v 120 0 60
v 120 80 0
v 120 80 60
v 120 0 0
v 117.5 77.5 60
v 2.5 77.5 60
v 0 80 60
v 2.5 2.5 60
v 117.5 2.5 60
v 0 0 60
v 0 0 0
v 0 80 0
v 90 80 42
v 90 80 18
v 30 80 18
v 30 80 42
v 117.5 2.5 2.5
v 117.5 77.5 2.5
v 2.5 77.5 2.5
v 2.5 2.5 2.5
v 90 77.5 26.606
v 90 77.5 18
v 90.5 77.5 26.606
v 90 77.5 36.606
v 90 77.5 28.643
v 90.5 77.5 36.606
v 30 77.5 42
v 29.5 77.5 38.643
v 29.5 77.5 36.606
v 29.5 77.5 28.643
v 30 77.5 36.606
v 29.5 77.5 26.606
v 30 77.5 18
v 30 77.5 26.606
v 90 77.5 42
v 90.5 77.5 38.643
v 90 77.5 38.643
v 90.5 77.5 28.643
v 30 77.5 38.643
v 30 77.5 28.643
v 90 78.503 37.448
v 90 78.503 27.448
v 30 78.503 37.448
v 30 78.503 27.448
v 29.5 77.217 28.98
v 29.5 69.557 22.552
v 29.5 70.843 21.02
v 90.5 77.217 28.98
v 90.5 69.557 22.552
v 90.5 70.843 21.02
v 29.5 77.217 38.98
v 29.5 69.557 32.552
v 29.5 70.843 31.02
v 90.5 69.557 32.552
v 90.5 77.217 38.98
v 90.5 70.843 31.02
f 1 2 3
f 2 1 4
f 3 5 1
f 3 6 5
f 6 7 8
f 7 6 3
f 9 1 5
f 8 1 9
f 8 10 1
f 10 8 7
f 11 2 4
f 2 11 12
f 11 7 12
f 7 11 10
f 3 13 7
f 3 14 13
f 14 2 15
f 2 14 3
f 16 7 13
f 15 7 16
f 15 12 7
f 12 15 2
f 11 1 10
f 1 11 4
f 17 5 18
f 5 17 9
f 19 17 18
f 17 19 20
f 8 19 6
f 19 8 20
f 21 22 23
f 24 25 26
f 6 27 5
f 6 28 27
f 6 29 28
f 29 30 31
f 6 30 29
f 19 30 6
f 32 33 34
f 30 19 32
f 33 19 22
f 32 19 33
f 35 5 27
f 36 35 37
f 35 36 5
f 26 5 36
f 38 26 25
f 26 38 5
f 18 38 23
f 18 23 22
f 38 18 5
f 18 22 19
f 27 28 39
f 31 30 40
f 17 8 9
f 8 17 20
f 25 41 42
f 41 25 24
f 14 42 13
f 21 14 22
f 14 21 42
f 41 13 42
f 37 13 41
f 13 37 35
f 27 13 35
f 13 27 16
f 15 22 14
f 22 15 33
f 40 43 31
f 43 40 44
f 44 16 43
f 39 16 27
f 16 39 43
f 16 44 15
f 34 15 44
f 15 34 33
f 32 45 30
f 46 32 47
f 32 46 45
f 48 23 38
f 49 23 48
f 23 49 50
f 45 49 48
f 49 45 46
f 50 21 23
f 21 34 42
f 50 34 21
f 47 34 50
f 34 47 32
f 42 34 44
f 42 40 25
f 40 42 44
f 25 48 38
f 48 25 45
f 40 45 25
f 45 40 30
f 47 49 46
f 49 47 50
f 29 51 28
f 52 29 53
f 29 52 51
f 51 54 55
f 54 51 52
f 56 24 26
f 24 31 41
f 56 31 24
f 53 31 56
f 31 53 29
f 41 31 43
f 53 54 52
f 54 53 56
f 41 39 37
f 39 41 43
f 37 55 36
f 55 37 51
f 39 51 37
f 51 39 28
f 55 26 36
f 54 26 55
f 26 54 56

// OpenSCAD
$fn = 32;

// ----------------------------------------------------------------------
// Vent box: louvers enclosure
// ----------------------------------------------------------------------

// --- parameters (mm) ---
box_l = 120;              // box length, X
box_w = 80;               // box width, Y
box_h = 60;               // box height, Z
wall_t = 2.5;             // shell wall thickness
win_l = 60;               // vent window width, X
win_h = 24;               // vent window height, Z
slat_t = 2;               // louver slat thickness
slat_d = 10;              // louver slat depth
slat_a = 40;              // louver slat angle, degrees
slat_pitch = 10;          // louver pitch
slat_yc = 74.03;          // slat centreline Y

win_z0 = (box_h - win_h) / 2;  // window lower edge Z
n_slats = 2;  // louver count
slat_z0 = win_z0 + (win_h - (n_slats - 1) * slat_pitch) / 2;

difference() {
  union() {
    difference() {
      cube([box_l, box_w, box_h]);
  translate([wall_t, wall_t, wall_t])
    cube([box_l - 2 * wall_t, box_w - 2 * wall_t, box_h]);
  translate([(box_l - win_l) / 2, box_w - wall_t - 1, win_z0])
    cube([win_l, wall_t + 2, win_h]);
    }
    for (i = [0 : n_slats - 1])
      translate([box_l / 2, slat_yc, slat_z0 + i * slat_pitch])
        rotate([slat_a, 0, 0])
          cube([win_l + 1, slat_d, slat_t], center = true);
  }
}
